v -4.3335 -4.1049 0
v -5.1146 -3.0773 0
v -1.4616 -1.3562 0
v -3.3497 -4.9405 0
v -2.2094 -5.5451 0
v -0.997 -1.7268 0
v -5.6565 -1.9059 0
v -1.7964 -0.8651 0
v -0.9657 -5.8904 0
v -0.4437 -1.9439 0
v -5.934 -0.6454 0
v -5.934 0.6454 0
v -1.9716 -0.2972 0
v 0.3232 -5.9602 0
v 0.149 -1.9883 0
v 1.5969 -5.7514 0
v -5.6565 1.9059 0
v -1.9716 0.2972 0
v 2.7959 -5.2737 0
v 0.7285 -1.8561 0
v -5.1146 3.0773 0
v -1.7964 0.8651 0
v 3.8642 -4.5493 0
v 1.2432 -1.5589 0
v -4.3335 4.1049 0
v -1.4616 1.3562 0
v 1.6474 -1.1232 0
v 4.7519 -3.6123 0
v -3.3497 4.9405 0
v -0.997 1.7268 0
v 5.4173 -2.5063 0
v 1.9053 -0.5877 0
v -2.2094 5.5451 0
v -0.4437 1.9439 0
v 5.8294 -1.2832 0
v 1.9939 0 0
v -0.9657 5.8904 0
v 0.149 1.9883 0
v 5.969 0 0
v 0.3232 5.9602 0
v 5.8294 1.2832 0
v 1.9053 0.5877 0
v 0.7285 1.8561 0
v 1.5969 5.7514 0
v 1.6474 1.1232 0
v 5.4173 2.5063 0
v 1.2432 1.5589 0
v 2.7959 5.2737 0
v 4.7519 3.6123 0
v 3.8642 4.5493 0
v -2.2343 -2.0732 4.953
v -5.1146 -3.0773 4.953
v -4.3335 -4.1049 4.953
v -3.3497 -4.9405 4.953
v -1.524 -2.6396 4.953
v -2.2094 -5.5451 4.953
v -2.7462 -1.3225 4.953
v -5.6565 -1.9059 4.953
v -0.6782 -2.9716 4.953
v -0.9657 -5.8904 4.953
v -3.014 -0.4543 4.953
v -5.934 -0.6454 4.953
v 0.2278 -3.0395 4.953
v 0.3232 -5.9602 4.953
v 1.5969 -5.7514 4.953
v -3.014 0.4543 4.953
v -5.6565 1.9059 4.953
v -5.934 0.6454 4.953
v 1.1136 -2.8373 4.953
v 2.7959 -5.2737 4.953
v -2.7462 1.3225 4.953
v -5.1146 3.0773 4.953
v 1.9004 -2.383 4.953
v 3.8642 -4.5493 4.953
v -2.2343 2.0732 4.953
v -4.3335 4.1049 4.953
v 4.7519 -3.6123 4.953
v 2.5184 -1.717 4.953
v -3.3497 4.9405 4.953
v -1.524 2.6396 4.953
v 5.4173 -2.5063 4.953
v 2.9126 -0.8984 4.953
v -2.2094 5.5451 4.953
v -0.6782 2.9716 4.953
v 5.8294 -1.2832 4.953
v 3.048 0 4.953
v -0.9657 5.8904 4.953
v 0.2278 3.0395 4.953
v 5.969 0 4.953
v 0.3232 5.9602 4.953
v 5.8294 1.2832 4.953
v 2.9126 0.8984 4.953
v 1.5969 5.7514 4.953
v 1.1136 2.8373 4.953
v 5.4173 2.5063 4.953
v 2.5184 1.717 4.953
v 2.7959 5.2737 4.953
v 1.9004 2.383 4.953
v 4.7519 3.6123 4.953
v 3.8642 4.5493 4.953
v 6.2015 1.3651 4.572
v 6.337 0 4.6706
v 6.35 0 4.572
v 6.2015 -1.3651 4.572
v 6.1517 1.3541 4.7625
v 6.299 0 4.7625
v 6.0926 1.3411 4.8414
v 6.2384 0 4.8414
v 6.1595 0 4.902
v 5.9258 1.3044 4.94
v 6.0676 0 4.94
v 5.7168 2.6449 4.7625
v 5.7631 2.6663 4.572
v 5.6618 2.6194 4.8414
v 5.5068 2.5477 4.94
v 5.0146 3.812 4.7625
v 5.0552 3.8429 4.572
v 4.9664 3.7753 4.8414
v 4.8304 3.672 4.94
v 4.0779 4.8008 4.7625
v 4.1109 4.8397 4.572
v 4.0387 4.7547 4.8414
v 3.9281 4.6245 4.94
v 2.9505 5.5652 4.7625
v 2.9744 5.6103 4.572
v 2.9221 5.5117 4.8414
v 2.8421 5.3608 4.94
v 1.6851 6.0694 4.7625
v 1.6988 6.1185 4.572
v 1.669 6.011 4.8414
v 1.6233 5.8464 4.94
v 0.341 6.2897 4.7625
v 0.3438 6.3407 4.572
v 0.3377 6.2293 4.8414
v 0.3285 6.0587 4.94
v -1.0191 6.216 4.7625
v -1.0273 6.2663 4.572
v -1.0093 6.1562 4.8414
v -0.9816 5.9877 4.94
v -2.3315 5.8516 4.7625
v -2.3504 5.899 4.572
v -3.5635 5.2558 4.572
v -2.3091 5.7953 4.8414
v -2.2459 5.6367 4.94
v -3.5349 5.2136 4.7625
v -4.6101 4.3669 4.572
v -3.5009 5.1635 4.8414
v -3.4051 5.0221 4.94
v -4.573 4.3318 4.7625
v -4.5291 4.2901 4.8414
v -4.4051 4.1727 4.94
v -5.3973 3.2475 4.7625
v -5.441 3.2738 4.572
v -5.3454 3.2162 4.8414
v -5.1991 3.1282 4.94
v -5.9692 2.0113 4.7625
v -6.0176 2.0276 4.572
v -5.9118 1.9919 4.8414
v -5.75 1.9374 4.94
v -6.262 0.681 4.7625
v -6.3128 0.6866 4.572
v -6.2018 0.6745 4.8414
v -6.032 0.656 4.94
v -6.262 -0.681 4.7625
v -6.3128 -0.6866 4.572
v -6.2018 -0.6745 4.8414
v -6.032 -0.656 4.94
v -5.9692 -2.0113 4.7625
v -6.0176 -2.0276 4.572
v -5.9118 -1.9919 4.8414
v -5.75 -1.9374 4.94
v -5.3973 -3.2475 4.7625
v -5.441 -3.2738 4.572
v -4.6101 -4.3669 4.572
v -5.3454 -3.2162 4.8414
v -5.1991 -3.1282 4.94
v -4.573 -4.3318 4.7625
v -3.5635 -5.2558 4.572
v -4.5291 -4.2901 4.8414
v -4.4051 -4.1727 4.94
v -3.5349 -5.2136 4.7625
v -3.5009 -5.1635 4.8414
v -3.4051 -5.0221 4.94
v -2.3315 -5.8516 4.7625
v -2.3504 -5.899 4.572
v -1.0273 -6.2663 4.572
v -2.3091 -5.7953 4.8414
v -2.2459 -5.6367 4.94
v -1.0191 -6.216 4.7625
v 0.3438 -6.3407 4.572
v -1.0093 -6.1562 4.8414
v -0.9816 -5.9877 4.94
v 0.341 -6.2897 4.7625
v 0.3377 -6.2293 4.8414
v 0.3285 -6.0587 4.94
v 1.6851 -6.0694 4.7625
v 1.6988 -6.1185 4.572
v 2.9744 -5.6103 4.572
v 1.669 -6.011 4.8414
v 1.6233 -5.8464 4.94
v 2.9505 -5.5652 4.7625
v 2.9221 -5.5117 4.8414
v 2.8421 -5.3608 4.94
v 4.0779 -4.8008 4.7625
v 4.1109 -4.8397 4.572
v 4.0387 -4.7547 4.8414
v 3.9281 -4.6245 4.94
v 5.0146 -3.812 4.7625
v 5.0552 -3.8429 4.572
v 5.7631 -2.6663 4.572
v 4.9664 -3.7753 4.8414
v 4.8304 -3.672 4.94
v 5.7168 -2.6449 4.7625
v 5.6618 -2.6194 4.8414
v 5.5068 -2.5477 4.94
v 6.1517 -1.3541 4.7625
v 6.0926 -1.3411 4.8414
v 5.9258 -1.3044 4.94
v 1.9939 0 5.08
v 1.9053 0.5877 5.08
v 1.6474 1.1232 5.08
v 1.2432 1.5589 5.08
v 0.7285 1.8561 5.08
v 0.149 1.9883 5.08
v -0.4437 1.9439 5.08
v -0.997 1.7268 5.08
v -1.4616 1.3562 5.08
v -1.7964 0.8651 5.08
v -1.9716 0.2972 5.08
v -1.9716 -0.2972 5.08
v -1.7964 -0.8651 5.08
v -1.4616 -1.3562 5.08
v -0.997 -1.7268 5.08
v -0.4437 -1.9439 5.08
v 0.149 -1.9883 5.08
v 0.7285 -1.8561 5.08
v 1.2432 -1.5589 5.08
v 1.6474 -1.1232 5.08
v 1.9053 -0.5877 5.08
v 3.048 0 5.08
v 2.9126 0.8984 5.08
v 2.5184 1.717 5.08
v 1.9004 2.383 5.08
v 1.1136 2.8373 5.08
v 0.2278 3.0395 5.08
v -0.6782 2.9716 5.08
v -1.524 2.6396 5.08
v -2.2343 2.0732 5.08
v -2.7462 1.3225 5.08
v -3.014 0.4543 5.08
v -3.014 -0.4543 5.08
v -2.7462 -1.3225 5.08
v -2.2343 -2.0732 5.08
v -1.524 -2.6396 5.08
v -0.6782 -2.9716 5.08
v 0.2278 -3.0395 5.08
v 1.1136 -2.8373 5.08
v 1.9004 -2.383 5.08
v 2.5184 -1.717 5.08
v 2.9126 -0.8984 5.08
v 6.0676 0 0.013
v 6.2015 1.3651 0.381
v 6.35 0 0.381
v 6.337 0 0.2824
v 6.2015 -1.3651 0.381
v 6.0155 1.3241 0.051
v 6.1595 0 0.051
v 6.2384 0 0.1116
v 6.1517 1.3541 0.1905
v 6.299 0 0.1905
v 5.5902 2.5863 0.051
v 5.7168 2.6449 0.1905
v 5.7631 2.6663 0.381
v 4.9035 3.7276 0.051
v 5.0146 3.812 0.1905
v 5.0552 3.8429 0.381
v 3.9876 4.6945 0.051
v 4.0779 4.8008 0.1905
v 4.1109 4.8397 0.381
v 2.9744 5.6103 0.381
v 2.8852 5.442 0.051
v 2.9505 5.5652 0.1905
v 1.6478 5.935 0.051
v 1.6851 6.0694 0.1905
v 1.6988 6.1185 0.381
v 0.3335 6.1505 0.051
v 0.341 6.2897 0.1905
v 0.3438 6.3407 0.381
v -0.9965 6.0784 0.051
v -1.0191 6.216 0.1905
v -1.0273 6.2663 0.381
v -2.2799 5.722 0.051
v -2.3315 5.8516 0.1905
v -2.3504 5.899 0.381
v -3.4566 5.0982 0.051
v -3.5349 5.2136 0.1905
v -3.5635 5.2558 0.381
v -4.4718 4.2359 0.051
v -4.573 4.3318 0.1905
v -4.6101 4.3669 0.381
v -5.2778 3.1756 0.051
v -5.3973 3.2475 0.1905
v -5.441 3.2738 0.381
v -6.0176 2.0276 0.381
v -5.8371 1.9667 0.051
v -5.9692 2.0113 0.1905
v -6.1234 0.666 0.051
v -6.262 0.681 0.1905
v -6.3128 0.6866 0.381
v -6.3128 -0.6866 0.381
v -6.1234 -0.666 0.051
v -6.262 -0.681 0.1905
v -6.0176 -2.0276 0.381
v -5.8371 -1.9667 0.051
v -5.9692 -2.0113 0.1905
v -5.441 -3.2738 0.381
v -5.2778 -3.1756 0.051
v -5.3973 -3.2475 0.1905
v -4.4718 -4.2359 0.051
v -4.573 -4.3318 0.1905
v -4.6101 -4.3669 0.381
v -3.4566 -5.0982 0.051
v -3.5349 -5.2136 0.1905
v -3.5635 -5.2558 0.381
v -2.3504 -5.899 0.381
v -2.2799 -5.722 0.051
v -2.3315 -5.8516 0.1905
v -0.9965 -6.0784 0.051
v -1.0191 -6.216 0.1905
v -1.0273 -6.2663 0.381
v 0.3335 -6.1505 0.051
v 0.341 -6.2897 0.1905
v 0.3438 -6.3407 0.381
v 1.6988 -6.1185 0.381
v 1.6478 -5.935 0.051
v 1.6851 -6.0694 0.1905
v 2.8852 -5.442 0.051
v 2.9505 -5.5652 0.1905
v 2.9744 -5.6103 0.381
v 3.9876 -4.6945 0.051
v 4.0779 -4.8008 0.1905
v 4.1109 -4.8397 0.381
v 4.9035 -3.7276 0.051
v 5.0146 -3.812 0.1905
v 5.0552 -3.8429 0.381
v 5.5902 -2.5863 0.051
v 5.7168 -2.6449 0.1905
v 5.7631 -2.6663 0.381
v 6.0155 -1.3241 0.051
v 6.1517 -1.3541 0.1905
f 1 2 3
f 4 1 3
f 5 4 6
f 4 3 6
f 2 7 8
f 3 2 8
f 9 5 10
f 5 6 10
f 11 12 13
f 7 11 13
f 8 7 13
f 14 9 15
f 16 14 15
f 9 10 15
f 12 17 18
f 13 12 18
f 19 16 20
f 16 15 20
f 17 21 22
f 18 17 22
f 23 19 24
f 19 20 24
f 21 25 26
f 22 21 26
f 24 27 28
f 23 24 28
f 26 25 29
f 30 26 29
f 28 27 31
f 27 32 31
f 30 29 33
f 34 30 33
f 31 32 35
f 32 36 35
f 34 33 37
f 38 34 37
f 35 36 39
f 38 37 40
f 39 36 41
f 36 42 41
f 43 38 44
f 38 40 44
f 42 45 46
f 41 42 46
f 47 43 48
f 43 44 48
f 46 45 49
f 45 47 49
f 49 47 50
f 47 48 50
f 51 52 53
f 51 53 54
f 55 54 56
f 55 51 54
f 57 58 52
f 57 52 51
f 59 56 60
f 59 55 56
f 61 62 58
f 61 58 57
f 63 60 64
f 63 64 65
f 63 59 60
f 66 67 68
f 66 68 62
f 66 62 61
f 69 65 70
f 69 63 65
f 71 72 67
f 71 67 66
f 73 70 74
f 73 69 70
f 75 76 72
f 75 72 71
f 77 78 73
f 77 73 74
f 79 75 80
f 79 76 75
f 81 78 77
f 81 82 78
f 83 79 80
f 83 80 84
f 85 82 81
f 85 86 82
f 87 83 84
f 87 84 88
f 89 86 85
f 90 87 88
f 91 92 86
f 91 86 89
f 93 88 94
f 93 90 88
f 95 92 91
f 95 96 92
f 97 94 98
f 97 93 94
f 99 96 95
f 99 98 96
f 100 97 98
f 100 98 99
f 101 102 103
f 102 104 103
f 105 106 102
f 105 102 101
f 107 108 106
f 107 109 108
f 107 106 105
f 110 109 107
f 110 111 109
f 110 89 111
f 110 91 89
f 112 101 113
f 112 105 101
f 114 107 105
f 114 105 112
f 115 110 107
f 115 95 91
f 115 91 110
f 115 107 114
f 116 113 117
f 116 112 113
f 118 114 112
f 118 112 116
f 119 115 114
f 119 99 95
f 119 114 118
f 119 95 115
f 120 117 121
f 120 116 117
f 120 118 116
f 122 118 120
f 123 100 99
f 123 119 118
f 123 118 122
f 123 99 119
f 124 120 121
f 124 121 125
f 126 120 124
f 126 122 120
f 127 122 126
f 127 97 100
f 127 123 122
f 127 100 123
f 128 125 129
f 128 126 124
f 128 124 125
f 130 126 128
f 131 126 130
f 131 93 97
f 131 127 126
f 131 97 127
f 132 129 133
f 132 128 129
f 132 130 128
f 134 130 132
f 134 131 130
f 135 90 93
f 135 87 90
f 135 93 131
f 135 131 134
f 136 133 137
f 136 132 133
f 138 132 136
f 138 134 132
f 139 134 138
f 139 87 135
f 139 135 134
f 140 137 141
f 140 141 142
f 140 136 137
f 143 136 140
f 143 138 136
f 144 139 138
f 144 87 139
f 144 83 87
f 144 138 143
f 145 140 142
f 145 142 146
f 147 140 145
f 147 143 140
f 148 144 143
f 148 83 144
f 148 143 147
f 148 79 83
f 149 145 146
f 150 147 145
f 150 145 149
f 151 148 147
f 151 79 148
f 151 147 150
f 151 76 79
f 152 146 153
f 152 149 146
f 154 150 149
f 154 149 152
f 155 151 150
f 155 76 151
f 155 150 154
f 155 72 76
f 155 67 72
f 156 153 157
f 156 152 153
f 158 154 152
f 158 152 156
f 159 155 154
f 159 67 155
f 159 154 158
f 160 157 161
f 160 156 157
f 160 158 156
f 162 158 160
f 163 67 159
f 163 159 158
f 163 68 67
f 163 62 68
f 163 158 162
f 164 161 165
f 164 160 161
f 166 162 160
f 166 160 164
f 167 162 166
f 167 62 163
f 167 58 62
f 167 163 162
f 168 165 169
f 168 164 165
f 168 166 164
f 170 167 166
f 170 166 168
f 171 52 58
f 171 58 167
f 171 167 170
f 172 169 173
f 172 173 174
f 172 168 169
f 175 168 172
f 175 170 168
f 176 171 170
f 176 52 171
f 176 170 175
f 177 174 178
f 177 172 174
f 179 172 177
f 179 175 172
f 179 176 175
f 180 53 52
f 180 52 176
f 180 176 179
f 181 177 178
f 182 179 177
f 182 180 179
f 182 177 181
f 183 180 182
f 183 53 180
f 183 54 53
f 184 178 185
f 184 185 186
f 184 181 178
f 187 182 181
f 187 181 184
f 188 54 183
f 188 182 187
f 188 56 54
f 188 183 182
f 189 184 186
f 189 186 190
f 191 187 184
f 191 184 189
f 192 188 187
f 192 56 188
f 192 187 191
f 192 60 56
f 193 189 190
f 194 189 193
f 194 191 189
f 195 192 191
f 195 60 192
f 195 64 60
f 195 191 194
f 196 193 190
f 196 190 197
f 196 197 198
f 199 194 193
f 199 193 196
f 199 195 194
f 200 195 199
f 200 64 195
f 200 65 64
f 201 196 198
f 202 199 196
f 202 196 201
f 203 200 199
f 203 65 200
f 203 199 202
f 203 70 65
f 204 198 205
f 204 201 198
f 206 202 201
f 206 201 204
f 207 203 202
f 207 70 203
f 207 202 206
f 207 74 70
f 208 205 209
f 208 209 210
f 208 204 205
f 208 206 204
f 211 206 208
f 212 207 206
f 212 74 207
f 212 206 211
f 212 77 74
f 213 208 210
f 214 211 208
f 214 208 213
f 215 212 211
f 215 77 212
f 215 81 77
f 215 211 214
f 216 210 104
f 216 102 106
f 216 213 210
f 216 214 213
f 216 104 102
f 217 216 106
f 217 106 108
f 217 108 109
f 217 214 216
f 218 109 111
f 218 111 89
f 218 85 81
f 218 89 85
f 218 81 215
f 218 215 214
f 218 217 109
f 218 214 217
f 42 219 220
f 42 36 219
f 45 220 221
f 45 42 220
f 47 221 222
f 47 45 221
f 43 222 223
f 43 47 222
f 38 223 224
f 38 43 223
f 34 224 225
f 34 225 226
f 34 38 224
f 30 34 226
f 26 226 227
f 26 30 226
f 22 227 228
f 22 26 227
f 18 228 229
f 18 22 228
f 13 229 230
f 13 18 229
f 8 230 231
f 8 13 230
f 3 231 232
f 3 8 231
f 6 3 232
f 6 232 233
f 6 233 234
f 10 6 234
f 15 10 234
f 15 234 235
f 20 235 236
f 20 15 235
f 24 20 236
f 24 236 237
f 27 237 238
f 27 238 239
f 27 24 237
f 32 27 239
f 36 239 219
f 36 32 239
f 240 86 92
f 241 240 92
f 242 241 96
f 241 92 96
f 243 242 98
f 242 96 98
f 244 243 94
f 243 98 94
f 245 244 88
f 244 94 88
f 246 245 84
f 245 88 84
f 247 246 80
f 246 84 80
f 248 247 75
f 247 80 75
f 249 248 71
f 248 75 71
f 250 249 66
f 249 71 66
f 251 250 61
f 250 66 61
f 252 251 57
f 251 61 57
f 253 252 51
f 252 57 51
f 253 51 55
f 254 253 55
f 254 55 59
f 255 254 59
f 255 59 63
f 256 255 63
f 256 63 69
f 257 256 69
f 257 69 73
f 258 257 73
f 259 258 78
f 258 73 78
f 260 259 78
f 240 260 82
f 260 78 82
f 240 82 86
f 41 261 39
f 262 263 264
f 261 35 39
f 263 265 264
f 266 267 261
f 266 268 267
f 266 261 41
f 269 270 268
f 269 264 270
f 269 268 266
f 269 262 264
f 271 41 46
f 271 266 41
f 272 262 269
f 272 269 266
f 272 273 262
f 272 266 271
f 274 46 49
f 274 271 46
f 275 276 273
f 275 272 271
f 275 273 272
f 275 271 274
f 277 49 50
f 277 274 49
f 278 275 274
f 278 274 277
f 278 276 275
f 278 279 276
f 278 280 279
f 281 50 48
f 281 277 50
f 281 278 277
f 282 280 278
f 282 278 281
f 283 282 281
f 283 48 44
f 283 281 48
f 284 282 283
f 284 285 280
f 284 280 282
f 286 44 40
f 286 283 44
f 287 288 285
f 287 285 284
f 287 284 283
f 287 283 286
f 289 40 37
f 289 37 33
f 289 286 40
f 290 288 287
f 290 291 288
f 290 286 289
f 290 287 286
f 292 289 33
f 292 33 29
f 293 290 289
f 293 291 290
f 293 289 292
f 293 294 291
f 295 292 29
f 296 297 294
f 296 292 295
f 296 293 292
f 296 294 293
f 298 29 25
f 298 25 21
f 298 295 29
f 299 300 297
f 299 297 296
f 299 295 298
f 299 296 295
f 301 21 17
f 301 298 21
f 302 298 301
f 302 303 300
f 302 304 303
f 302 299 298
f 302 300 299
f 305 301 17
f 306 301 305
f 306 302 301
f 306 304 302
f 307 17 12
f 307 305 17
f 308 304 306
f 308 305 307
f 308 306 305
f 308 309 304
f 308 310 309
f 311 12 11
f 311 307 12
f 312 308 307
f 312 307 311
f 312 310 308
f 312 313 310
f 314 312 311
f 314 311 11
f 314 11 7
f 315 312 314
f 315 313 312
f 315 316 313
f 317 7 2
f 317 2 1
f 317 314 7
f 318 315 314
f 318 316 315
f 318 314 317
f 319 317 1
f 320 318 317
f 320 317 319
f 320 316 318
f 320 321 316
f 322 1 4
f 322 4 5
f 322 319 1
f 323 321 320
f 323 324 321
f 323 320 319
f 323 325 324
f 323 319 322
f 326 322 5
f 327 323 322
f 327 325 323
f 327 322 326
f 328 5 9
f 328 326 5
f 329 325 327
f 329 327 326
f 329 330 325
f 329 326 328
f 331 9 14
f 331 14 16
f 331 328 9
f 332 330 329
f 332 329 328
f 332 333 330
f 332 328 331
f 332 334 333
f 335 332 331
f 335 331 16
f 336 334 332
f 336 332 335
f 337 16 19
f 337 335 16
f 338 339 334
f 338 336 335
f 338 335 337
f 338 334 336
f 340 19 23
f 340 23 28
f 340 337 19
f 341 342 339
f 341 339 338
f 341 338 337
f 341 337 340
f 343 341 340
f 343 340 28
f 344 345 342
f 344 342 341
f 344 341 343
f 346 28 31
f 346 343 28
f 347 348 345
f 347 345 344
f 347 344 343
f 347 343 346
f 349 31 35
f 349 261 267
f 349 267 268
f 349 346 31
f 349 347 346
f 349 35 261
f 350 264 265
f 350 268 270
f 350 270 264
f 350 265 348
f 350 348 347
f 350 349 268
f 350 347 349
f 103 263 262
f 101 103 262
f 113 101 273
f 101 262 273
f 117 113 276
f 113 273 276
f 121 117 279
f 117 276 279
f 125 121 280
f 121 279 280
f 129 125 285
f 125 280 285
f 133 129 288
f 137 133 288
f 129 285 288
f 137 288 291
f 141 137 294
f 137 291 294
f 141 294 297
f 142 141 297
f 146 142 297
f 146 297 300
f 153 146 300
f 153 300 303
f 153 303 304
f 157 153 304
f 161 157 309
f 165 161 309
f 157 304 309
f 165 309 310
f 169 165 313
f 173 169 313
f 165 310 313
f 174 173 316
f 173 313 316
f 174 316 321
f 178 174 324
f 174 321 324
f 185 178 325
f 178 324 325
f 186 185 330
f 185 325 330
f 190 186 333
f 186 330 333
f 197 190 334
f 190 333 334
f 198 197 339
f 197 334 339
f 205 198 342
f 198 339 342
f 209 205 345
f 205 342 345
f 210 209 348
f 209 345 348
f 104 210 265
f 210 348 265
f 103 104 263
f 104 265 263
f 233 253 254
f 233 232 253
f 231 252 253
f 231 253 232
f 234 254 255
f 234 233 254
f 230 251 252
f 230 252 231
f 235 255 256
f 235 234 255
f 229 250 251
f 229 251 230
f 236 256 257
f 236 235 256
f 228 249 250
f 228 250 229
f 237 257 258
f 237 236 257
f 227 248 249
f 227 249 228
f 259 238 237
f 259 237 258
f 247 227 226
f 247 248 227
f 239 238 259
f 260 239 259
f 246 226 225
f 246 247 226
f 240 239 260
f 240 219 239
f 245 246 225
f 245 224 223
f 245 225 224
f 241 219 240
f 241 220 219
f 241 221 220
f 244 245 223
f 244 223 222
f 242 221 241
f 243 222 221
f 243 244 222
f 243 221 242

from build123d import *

# Parameters (mm, degrees)
F0_R     = 6.35
F0_R_2   = 1.9939
F1_DEPTH = 4.953
F2_R     = 3.048
F2_R_2   = 1.9939
F3_DEPTH = 0.127
F4_R     = 0.381


with BuildPart() as f1:
    # F0 (on Top) → F1 (new body)
    with BuildSketch(Plane.XY):
        Circle(F0_R)
        Circle(F0_R_2, mode=Mode.SUBTRACT)
    extrude(amount=F1_DEPTH)

    # F2 (on face) → F3 (join)
    with BuildSketch(Plane.XY.offset(4.953)):
        Circle(F2_R)
        Circle(F2_R_2, mode=Mode.SUBTRACT)
    extrude(amount=F3_DEPTH)

    # F4
    f4_edges = [f1.edges().sort_by_distance(p)[0] for p in [
        (-6.35, 0, 4.953),
        (-6.35, 0, 0),
    ]]
    fillet(f4_edges, radius=F4_R)


solid = f1.part
